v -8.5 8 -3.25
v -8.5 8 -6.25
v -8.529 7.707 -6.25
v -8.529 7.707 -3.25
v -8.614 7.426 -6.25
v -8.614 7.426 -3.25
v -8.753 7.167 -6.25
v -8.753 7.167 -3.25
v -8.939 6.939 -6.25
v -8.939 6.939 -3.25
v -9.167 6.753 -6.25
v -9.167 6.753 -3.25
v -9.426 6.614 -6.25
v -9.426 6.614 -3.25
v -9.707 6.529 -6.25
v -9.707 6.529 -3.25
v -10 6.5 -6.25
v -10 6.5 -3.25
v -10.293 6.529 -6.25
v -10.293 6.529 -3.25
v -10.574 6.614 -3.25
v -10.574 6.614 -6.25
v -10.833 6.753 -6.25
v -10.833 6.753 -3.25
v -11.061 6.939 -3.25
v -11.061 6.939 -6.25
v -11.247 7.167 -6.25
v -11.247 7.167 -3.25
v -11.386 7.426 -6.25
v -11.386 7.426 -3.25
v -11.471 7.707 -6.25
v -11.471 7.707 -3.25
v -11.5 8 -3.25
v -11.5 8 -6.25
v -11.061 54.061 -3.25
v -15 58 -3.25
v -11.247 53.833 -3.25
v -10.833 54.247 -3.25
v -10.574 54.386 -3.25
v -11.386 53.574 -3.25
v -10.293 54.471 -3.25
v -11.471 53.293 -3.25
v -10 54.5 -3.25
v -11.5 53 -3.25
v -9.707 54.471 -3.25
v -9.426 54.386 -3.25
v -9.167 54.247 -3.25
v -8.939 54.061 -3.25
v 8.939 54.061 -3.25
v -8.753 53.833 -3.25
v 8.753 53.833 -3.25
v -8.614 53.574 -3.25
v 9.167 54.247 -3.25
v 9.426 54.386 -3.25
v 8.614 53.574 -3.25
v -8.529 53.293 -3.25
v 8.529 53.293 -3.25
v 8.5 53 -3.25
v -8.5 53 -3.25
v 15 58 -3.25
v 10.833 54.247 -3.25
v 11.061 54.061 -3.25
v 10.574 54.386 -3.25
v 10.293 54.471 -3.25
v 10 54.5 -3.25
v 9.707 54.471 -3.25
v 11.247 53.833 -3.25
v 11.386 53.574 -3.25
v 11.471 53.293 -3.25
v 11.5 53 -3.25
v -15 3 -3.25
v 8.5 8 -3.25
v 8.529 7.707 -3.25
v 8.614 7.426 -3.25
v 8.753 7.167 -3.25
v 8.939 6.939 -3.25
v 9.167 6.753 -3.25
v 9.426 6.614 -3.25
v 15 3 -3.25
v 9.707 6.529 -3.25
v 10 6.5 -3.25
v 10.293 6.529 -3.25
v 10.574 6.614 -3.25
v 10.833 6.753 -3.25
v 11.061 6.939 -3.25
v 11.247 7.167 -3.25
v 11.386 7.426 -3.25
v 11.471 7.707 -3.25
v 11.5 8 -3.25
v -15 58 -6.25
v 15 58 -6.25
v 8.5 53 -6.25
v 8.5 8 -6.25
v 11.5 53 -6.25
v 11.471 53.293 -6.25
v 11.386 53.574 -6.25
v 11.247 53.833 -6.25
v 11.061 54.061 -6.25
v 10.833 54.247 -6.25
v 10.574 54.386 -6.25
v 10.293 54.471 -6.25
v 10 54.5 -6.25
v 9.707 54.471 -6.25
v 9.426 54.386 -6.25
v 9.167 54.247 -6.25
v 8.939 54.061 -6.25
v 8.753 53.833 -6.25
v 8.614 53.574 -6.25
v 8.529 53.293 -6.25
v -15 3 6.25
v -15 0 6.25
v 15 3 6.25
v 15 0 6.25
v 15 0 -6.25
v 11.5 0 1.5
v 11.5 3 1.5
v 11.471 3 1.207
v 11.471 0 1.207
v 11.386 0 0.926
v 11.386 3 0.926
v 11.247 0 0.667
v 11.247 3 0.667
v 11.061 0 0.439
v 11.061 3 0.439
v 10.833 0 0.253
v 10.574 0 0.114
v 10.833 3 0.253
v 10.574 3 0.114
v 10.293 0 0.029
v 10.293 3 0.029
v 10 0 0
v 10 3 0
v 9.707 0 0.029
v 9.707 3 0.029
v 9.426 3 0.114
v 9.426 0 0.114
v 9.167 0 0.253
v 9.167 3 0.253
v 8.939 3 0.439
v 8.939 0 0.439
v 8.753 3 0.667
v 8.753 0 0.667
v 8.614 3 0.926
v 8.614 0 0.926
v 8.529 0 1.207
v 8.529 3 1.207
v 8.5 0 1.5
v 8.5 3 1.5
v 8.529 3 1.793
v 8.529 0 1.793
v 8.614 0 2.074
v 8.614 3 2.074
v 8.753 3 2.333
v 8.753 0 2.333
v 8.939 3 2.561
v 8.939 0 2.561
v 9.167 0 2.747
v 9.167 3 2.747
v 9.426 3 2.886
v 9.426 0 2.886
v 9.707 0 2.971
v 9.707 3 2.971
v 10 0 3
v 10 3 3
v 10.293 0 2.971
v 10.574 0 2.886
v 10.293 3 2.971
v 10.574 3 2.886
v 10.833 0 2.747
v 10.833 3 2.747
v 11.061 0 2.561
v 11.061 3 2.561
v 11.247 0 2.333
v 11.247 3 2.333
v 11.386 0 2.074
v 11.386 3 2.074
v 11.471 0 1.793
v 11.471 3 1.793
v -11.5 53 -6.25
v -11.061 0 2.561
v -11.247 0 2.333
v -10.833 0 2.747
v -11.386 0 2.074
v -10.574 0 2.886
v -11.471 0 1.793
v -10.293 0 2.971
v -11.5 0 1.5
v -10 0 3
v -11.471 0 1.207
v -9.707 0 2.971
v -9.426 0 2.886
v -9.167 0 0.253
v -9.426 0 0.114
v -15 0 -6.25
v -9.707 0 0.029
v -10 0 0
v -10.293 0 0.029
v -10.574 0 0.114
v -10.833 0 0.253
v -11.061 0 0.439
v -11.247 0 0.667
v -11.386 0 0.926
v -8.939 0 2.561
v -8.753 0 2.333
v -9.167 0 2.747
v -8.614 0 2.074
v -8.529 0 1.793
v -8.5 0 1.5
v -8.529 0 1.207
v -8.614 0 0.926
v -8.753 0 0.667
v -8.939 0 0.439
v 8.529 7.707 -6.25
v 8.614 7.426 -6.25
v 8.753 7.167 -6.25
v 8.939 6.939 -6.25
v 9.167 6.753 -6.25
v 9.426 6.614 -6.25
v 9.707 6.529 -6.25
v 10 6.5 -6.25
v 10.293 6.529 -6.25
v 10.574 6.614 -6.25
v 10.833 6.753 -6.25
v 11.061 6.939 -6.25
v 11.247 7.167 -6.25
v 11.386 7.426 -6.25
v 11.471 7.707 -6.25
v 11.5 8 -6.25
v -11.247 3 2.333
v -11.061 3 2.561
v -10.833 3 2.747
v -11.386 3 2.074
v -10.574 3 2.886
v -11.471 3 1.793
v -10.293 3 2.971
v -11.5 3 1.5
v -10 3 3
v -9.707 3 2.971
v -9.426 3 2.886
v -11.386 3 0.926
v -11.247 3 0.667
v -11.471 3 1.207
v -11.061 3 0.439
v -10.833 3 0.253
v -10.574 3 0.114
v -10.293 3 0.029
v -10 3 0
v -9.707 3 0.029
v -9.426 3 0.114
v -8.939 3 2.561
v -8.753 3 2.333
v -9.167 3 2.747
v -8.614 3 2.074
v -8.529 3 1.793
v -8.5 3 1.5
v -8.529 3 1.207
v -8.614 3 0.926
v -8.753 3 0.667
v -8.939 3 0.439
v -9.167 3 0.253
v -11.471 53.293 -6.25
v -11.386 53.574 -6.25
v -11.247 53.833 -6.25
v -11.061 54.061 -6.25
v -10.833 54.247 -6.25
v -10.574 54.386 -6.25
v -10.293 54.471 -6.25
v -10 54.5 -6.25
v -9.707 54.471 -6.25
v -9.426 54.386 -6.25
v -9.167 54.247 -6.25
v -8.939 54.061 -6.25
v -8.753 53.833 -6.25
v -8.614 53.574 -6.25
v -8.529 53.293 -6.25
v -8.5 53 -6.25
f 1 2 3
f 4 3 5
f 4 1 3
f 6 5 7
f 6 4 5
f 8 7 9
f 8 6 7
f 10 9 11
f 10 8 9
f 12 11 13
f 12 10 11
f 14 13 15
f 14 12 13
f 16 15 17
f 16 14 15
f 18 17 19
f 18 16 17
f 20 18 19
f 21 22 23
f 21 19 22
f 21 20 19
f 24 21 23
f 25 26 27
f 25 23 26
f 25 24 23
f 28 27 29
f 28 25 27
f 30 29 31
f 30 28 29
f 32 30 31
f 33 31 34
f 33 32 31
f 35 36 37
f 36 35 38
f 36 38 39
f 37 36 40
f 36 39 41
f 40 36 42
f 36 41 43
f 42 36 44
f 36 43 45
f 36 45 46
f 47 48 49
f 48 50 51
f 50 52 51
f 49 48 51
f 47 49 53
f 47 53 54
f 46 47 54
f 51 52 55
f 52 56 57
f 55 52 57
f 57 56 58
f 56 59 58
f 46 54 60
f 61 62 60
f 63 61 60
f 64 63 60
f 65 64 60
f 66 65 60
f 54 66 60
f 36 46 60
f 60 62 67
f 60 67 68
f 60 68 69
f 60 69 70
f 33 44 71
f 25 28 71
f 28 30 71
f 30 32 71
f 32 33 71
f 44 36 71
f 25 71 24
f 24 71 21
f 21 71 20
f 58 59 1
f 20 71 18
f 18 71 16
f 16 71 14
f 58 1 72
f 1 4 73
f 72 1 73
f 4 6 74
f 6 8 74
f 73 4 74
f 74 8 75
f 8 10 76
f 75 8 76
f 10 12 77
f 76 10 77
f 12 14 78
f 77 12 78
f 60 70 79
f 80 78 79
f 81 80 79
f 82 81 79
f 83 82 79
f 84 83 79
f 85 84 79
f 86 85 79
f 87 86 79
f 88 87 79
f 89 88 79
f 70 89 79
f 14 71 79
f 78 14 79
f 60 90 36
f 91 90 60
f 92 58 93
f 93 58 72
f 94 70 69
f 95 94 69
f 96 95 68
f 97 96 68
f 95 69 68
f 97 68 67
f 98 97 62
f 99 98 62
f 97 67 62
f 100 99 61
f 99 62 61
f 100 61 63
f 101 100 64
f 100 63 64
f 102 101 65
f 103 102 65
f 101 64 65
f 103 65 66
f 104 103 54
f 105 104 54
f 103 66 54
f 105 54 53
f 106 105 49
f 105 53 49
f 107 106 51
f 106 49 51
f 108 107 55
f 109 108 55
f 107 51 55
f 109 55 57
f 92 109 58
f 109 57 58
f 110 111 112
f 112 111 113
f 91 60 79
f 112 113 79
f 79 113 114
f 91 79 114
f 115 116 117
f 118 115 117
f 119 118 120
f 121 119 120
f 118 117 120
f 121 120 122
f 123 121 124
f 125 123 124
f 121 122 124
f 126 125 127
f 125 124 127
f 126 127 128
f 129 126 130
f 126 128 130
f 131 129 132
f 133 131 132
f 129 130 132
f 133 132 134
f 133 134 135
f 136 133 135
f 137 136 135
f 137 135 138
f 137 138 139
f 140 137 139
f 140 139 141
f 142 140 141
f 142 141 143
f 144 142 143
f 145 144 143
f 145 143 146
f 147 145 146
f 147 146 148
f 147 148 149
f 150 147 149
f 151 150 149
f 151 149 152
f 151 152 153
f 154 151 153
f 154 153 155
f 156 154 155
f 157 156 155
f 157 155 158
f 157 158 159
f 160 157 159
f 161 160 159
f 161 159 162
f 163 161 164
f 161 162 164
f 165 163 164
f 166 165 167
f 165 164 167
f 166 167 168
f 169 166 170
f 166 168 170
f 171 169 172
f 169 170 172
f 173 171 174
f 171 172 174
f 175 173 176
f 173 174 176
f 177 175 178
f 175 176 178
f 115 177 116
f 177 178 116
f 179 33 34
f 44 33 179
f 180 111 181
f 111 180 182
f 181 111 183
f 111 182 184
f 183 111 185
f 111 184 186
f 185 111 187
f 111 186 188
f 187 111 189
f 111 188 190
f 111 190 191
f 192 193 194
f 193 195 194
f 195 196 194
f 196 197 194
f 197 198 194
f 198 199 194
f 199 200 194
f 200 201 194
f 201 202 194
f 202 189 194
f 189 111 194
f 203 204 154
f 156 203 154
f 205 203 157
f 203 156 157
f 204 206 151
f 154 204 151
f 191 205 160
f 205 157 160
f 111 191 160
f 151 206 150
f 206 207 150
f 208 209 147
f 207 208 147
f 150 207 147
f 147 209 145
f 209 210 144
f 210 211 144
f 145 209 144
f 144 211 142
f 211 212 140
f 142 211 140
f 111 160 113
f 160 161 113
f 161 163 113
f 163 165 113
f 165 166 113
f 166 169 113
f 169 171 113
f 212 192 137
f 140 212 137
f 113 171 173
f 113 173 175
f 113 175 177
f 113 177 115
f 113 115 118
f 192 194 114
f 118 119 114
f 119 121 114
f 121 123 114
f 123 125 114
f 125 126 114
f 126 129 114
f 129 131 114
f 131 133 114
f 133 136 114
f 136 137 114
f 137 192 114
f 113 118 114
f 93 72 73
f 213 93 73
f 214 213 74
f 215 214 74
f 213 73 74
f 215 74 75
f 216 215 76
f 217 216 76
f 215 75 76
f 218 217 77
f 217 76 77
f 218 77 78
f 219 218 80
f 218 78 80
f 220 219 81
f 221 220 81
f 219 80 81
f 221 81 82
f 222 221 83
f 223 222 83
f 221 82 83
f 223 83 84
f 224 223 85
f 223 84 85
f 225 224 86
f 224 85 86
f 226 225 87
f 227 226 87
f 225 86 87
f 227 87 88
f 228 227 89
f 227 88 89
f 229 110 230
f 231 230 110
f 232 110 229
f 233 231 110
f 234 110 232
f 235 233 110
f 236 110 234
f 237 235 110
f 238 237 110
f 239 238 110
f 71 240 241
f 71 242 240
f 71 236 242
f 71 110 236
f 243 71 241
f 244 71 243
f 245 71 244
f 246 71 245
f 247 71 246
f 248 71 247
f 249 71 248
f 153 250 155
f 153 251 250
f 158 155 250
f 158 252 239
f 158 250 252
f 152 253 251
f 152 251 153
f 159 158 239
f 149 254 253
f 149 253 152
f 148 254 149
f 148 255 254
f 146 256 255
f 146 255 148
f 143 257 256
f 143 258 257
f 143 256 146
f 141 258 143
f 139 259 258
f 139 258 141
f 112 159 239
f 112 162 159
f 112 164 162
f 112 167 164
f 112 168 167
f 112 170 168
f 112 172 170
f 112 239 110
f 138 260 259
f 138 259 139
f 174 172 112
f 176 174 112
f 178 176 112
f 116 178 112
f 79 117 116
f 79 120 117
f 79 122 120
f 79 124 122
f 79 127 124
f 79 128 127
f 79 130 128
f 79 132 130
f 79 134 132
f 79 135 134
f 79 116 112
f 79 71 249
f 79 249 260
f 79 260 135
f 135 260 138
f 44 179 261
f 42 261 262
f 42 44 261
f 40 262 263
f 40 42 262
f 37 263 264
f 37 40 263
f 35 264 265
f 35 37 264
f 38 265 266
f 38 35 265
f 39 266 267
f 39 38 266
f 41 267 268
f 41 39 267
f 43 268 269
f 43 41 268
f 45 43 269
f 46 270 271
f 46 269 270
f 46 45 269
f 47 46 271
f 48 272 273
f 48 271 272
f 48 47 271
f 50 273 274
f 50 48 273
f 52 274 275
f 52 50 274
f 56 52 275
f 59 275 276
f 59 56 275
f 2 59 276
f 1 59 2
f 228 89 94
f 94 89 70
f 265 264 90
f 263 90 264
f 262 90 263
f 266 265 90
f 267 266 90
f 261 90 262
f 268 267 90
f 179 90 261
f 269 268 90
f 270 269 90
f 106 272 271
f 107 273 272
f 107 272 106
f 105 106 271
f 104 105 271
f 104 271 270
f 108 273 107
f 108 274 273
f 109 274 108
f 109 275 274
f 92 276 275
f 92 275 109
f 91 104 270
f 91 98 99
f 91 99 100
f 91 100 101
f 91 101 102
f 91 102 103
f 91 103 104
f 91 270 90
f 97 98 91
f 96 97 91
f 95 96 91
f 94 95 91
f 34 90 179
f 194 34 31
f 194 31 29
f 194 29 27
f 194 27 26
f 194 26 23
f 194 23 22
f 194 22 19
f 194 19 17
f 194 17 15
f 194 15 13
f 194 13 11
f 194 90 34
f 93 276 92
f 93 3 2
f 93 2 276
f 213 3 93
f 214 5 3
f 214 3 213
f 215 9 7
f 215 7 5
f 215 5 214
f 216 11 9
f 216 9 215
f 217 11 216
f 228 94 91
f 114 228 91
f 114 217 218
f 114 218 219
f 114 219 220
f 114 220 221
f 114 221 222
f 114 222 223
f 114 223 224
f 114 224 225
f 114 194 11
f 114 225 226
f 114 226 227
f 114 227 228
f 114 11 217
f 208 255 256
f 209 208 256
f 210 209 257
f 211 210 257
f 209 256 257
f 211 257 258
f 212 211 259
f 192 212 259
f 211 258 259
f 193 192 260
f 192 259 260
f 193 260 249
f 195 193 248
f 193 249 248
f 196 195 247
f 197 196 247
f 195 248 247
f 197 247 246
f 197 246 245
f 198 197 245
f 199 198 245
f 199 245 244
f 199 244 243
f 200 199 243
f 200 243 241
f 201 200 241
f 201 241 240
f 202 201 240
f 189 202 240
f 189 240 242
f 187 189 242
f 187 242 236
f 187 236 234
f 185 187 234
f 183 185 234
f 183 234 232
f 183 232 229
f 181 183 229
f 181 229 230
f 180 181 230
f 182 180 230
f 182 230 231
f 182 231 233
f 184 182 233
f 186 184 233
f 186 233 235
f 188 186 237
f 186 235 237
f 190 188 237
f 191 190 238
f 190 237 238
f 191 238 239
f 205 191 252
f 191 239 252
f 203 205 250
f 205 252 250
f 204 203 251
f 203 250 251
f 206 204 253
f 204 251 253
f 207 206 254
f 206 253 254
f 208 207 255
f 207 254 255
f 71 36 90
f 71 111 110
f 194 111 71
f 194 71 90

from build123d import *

# Parameters (mm, degrees)
SKETCH1_W           = 30
SKETCH1_H           = 12.5
BOSS_EXTRUDE1_DEPTH = 3
SKETCH2_W           = 30
SKETCH2_H           = 3
BOSS_EXTRUDE2_DEPTH = 55
CUT_EXTRUDE1_DEPTH  = 4
SKETCH4_R           = 1.5
CUT_EXTRUDE2_DEPTH  = 4


with BuildPart() as part:
    # Sketch1 → Boss-Extrude1 (new body)
    with BuildSketch(Plane(origin=(0, 0, 0), x_dir=(1, 0, 0), z_dir=(0, 1, 0))):
        Rectangle(SKETCH1_W, SKETCH1_H)
    extrude(amount=BOSS_EXTRUDE1_DEPTH)

    # Sketch2 → Boss-Extrude2 (add)
    with BuildSketch(Plane(origin=(0, 3, 0), x_dir=(1, 0, 0), z_dir=(0, 1, 0))):
        with Locations((0, 4.75)):
            Rectangle(SKETCH2_W, SKETCH2_H)
    extrude(amount=BOSS_EXTRUDE2_DEPTH)

    # Sketch3 → Cut-Extrude1 (cut, through all)
    with BuildSketch(Plane.XY.offset(-3.25)):
        with BuildLine():
            Line((-8.5, 53), (-8.5, 8))
            ThreePointArc((-8.5, 8), (-10, 6.5), (-11.5, 8))
            Line((-11.5, 8), (-11.5, 53))
            ThreePointArc((-11.5, 53), (-10, 54.5), (-8.5, 53))
        make_face()
        with BuildLine():
            Line((8.5, 53), (8.5, 8))
            ThreePointArc((8.5, 8), (10, 6.5), (11.5, 8))
            Line((11.5, 8), (11.5, 53))
            ThreePointArc((11.5, 53), (10, 54.5), (8.5, 53))
        make_face()
    extrude(amount=-CUT_EXTRUDE1_DEPTH, mode=Mode.SUBTRACT)

    # Sketch4 → Cut-Extrude2 (cut, through all)
    with BuildSketch(Plane(origin=(0, 3, 0), x_dir=(1, 0, 0), z_dir=(0, 1, 0))):
        with Locations((-10, -1.5)):
            Circle(SKETCH4_R)
        with Locations((10, -1.5)):
            Circle(SKETCH4_R)
    extrude(amount=-CUT_EXTRUDE2_DEPTH, mode=Mode.SUBTRACT)


solid = part.part
